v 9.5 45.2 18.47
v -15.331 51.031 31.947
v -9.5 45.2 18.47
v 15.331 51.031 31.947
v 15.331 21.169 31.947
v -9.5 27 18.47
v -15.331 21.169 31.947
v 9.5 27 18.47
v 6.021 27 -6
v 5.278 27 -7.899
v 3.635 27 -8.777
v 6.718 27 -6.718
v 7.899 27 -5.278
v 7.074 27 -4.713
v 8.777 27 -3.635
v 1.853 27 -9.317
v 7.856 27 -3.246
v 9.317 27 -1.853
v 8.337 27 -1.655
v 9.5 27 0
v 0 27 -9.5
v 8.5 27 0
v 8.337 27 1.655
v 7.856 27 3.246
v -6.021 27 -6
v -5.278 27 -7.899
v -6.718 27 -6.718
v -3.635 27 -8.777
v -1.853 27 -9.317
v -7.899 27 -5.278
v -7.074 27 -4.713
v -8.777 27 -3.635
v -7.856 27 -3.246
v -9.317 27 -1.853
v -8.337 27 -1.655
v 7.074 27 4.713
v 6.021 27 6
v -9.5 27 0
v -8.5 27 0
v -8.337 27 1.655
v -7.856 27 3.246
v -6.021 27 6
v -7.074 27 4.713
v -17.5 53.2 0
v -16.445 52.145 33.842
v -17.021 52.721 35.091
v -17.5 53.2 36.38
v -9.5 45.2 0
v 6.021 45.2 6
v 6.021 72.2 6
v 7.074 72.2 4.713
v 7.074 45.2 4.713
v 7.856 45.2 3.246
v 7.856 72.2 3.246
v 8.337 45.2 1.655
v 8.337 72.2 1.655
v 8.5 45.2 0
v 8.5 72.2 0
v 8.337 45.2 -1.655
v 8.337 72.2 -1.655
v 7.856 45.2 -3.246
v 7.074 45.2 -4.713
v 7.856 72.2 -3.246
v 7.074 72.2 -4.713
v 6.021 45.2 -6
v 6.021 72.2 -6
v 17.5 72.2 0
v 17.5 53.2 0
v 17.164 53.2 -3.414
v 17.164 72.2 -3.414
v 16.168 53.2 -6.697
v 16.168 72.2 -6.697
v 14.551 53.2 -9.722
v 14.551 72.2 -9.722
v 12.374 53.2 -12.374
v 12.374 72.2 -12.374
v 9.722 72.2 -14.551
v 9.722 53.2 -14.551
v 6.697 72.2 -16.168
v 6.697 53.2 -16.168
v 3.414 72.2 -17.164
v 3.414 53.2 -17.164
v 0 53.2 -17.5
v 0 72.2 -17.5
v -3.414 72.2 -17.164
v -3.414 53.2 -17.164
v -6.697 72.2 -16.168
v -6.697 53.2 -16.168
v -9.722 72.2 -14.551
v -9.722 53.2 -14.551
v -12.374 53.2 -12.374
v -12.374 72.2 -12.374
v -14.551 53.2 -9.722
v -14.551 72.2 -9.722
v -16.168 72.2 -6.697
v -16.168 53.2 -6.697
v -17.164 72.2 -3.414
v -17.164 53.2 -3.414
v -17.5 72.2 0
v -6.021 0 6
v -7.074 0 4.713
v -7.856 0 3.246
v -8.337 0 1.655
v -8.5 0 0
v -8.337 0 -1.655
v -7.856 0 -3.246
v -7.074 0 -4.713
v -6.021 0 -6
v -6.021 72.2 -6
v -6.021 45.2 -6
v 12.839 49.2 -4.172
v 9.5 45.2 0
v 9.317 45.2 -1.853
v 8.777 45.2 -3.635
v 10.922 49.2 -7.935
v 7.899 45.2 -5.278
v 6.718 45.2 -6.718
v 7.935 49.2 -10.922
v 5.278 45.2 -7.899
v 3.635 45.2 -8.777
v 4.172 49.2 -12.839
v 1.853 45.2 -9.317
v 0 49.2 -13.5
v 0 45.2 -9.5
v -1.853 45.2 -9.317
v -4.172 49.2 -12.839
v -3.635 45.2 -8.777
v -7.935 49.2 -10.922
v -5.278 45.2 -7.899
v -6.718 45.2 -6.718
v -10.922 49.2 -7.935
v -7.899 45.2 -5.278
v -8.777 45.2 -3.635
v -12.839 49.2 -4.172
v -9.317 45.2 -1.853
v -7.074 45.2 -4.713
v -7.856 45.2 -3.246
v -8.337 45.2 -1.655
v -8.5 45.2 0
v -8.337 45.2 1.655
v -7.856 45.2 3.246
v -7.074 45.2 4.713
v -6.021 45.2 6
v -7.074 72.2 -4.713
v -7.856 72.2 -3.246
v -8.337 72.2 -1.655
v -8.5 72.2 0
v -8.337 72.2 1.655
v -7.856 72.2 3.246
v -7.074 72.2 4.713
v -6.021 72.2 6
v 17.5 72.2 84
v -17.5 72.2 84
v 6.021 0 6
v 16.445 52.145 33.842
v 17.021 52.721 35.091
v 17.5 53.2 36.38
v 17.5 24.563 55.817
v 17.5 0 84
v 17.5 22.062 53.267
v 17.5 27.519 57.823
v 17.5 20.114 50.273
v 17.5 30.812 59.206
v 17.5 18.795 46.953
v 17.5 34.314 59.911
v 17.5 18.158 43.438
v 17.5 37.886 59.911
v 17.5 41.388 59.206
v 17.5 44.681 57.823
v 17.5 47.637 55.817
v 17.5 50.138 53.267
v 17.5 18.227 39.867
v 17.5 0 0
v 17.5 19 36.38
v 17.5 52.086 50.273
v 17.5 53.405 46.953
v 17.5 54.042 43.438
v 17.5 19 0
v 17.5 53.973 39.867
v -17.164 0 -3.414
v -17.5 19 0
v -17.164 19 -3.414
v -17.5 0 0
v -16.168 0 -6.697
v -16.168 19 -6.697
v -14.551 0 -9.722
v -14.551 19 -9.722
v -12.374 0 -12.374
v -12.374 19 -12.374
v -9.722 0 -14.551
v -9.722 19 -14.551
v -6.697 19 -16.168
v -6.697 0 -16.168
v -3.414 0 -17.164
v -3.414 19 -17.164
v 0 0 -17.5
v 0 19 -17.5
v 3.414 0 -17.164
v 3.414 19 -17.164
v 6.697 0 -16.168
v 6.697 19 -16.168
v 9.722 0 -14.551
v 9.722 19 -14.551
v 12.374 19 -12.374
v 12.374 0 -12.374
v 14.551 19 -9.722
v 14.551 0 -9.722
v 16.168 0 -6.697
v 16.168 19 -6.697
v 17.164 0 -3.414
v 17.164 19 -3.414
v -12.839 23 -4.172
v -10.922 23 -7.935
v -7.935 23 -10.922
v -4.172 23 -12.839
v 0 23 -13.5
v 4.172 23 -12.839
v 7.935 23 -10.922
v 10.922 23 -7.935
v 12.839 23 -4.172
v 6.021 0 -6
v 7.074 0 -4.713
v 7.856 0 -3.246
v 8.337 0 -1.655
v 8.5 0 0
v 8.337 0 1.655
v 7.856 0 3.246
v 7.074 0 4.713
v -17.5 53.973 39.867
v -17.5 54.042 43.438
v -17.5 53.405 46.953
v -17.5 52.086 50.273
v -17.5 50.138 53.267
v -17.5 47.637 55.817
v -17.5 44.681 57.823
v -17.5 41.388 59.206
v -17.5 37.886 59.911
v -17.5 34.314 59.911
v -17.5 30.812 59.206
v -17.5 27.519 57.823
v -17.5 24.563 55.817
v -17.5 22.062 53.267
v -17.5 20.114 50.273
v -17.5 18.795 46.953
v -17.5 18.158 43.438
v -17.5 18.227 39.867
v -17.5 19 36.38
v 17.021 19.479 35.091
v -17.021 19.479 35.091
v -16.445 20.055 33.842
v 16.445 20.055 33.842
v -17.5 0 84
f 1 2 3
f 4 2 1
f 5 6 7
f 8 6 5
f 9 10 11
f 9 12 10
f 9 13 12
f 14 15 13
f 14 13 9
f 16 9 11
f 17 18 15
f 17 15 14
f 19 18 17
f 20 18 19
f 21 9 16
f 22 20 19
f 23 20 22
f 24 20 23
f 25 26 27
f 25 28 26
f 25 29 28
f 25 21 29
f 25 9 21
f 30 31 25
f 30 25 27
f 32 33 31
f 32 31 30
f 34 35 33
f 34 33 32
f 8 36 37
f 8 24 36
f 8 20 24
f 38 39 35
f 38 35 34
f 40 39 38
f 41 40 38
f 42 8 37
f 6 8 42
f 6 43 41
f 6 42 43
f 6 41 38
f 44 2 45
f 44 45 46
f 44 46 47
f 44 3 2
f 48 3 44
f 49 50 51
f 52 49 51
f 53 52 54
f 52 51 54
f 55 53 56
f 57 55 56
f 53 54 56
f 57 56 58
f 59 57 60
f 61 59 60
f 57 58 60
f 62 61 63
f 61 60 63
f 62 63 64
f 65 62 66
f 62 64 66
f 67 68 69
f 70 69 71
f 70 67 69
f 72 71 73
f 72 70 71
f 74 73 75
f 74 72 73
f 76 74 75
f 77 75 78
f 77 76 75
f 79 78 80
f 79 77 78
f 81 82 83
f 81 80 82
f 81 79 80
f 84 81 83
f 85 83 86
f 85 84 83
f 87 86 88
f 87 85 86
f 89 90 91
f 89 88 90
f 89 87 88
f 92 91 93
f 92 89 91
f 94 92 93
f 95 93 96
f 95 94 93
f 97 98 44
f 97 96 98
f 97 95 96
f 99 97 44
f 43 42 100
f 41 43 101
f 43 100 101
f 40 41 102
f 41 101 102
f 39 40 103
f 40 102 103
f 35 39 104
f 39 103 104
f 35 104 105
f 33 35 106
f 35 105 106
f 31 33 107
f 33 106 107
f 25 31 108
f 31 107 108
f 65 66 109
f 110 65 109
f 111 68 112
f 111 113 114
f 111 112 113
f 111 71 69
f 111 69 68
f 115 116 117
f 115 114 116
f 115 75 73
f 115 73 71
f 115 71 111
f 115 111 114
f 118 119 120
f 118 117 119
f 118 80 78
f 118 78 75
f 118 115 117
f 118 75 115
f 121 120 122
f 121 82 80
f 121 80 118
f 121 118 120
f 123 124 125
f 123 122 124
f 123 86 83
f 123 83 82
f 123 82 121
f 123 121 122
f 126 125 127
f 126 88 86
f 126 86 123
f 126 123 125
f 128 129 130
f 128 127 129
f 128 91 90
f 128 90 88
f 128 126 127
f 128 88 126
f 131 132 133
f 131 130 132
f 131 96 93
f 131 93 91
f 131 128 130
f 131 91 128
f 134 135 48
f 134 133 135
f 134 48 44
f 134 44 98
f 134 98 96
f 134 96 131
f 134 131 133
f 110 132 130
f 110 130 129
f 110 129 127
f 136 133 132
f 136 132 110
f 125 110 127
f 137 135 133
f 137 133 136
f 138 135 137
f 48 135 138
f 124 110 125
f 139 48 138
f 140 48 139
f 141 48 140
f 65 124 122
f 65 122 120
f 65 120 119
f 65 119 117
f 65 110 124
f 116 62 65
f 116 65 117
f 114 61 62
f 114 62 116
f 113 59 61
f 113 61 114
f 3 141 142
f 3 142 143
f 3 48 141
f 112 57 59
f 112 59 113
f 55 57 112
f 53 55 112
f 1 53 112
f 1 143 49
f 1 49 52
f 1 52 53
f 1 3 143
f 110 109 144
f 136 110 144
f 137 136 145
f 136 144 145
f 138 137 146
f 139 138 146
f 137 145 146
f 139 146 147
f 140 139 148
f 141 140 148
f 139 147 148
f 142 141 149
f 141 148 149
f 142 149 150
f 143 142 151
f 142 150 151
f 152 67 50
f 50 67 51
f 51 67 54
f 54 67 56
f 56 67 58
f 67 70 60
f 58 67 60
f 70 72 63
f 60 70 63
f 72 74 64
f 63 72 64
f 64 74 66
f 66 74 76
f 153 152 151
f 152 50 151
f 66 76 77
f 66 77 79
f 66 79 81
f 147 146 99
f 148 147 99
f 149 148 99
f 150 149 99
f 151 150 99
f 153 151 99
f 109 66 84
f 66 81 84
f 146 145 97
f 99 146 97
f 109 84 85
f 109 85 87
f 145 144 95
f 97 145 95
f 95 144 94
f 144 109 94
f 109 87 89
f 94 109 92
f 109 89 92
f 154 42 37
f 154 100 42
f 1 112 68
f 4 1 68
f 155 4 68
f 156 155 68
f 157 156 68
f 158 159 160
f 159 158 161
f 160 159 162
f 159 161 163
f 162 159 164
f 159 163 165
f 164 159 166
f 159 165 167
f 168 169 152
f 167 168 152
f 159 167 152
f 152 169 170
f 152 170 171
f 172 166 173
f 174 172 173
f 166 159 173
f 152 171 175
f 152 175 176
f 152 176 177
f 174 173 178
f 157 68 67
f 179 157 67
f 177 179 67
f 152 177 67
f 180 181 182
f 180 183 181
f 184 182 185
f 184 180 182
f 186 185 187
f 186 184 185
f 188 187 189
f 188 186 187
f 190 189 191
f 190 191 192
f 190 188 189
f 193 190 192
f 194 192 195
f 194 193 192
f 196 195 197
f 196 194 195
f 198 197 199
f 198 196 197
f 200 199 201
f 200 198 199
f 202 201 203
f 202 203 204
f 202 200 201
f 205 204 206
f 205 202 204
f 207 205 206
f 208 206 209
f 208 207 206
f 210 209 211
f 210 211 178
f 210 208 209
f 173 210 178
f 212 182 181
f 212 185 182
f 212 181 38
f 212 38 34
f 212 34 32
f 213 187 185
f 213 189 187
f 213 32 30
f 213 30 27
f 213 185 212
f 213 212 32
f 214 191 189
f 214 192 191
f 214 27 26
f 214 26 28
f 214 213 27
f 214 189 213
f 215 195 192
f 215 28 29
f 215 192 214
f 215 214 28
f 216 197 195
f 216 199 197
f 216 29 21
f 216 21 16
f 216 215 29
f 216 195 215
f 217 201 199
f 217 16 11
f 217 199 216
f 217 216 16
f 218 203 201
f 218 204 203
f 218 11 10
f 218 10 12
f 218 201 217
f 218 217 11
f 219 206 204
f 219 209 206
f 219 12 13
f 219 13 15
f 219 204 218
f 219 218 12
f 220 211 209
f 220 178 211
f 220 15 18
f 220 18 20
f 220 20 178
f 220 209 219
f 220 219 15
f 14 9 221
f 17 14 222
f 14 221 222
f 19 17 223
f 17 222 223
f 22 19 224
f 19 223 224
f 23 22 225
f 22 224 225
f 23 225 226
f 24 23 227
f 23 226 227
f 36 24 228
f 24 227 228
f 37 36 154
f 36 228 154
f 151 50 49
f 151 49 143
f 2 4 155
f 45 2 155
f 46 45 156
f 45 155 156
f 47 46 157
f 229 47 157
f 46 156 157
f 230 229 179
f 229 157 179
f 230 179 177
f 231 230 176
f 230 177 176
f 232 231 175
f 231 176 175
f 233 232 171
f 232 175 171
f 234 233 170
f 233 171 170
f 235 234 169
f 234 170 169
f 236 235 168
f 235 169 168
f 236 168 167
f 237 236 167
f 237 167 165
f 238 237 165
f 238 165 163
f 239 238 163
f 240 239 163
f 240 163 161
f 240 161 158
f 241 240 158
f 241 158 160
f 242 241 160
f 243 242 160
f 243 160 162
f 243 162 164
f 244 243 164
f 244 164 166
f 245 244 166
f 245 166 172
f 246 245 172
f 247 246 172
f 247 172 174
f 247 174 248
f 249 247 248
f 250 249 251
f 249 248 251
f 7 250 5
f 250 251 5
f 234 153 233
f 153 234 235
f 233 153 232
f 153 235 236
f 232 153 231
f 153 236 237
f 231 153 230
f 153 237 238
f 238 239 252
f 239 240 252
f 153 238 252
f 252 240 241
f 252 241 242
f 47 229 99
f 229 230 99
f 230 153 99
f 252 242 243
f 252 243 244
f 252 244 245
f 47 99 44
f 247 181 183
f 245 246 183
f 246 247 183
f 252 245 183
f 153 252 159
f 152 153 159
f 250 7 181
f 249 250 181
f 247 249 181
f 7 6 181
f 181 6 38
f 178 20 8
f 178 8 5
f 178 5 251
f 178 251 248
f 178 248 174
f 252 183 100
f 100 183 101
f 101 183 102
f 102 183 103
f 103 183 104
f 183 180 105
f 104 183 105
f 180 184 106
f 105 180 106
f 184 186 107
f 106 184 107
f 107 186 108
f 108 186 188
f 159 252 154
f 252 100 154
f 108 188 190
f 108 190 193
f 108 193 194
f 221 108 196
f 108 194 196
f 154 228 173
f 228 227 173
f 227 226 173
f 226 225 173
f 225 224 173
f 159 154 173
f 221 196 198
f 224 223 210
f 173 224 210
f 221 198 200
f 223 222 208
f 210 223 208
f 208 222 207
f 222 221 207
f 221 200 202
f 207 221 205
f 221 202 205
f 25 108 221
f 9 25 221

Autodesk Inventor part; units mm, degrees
ref_plane "YZ Plane" through (0, 0, 0) normal (1, 0, 0) x (0, 1, 0)
ref_plane "XZ Plane" through (0, 0, 0) normal (0, 1, 0) x (-1, 0, 0)
sketch "Эскиз1" plane through (0, 0, 0) normal (0, 1, 0) x (-1, 0, 0)
  arc A0 (6.0208, -6) -> (6.0208, 6) centre (0, 0) ccw
  line L0 (6.0208, -6) -> (-6.0208, -6)
  arc A1 (-6.0208, 6) -> (-6.0208, -6) centre (0, 0) ccw
  line L1 (6.0208, 6) -> (-6.0208, 6)
  line L2 (17.5, 37) -> (-17.5, 37)
  line L3 (-17.5, 37) -> (-17.5, 0)
  arc A2 (-17.5, 0) -> (17.5, 0) centre (0, 0) ccw
  line L4 (17.5, 0) -> (17.5, 37)
  line L5 (17.5, 0) -> (17.5, 57)
  line L6 (-17.5, 37) -> (17.5, 37)
  line L7 (17.5, 37) -> (17.5, 57)
  line L8 (17.5, 57) -> (-17.5, 57)
  line L9 (-17.5, 57) -> (-17.5, 37)
extrude "Выдавливание1" add sketch "Эскиз1" along normal blind 27
sketch "Эскиз2" plane through (-17.5, 0, 57) normal (0, 0, 1) x (1, 0, 0)
  line L0 (0, 0) -> (35, 0)
  line L1 (35, 0) -> (35, 72.2)
  line L2 (35, 72.2) -> (0, 72.2)
  line L3 (0, 72.2) -> (0, 0)
  point P0 (17.5, 0)
  dimension "d2" = 72.2
extrude "Выдавливание2" add sketch "Эскиз2" along normal blind 27
ref_plane "РабПлоскость1" through (17.5, 36.1, 84) normal (0, 1, 0) x (1, 0, 0)
mirror "Зеркальное отражение1" about plane through (17.5, 36.1, 84) normal (0, 1, 0) of "Выдавливание1"
sketch "Эскиз3" plane through (17.5, 0, 0) normal (1, 0, 0) x (0, 0, -1)
  line L0 (-57, 45.2) -> (-57, 27) projected
  line L1 (-57, 36.1) -> (-42, 36.1)
  circle A0 centre (-42, 36.1) radius 18
  point P0 (0, 0)
  dimension "d5" = 15
  dimension "d6" = 36
extrude "Выдавливание3" cut sketch "Эскиз3" against normal blind 93.5
chamfer "Фаска2" distance 8 angle 45 8 edges at (0, 27, 26.4697) (0, 45.2, 26.4697) (-17.5, 27, 13.2349) (0, 27, -17.5) (17.5, 27, 13.2349) (-17.5, 45.2, 13.2349) (0, 45.2, -17.5) (17.5, 45.2, 13.2349)
properties part number "joint_2_part1"
